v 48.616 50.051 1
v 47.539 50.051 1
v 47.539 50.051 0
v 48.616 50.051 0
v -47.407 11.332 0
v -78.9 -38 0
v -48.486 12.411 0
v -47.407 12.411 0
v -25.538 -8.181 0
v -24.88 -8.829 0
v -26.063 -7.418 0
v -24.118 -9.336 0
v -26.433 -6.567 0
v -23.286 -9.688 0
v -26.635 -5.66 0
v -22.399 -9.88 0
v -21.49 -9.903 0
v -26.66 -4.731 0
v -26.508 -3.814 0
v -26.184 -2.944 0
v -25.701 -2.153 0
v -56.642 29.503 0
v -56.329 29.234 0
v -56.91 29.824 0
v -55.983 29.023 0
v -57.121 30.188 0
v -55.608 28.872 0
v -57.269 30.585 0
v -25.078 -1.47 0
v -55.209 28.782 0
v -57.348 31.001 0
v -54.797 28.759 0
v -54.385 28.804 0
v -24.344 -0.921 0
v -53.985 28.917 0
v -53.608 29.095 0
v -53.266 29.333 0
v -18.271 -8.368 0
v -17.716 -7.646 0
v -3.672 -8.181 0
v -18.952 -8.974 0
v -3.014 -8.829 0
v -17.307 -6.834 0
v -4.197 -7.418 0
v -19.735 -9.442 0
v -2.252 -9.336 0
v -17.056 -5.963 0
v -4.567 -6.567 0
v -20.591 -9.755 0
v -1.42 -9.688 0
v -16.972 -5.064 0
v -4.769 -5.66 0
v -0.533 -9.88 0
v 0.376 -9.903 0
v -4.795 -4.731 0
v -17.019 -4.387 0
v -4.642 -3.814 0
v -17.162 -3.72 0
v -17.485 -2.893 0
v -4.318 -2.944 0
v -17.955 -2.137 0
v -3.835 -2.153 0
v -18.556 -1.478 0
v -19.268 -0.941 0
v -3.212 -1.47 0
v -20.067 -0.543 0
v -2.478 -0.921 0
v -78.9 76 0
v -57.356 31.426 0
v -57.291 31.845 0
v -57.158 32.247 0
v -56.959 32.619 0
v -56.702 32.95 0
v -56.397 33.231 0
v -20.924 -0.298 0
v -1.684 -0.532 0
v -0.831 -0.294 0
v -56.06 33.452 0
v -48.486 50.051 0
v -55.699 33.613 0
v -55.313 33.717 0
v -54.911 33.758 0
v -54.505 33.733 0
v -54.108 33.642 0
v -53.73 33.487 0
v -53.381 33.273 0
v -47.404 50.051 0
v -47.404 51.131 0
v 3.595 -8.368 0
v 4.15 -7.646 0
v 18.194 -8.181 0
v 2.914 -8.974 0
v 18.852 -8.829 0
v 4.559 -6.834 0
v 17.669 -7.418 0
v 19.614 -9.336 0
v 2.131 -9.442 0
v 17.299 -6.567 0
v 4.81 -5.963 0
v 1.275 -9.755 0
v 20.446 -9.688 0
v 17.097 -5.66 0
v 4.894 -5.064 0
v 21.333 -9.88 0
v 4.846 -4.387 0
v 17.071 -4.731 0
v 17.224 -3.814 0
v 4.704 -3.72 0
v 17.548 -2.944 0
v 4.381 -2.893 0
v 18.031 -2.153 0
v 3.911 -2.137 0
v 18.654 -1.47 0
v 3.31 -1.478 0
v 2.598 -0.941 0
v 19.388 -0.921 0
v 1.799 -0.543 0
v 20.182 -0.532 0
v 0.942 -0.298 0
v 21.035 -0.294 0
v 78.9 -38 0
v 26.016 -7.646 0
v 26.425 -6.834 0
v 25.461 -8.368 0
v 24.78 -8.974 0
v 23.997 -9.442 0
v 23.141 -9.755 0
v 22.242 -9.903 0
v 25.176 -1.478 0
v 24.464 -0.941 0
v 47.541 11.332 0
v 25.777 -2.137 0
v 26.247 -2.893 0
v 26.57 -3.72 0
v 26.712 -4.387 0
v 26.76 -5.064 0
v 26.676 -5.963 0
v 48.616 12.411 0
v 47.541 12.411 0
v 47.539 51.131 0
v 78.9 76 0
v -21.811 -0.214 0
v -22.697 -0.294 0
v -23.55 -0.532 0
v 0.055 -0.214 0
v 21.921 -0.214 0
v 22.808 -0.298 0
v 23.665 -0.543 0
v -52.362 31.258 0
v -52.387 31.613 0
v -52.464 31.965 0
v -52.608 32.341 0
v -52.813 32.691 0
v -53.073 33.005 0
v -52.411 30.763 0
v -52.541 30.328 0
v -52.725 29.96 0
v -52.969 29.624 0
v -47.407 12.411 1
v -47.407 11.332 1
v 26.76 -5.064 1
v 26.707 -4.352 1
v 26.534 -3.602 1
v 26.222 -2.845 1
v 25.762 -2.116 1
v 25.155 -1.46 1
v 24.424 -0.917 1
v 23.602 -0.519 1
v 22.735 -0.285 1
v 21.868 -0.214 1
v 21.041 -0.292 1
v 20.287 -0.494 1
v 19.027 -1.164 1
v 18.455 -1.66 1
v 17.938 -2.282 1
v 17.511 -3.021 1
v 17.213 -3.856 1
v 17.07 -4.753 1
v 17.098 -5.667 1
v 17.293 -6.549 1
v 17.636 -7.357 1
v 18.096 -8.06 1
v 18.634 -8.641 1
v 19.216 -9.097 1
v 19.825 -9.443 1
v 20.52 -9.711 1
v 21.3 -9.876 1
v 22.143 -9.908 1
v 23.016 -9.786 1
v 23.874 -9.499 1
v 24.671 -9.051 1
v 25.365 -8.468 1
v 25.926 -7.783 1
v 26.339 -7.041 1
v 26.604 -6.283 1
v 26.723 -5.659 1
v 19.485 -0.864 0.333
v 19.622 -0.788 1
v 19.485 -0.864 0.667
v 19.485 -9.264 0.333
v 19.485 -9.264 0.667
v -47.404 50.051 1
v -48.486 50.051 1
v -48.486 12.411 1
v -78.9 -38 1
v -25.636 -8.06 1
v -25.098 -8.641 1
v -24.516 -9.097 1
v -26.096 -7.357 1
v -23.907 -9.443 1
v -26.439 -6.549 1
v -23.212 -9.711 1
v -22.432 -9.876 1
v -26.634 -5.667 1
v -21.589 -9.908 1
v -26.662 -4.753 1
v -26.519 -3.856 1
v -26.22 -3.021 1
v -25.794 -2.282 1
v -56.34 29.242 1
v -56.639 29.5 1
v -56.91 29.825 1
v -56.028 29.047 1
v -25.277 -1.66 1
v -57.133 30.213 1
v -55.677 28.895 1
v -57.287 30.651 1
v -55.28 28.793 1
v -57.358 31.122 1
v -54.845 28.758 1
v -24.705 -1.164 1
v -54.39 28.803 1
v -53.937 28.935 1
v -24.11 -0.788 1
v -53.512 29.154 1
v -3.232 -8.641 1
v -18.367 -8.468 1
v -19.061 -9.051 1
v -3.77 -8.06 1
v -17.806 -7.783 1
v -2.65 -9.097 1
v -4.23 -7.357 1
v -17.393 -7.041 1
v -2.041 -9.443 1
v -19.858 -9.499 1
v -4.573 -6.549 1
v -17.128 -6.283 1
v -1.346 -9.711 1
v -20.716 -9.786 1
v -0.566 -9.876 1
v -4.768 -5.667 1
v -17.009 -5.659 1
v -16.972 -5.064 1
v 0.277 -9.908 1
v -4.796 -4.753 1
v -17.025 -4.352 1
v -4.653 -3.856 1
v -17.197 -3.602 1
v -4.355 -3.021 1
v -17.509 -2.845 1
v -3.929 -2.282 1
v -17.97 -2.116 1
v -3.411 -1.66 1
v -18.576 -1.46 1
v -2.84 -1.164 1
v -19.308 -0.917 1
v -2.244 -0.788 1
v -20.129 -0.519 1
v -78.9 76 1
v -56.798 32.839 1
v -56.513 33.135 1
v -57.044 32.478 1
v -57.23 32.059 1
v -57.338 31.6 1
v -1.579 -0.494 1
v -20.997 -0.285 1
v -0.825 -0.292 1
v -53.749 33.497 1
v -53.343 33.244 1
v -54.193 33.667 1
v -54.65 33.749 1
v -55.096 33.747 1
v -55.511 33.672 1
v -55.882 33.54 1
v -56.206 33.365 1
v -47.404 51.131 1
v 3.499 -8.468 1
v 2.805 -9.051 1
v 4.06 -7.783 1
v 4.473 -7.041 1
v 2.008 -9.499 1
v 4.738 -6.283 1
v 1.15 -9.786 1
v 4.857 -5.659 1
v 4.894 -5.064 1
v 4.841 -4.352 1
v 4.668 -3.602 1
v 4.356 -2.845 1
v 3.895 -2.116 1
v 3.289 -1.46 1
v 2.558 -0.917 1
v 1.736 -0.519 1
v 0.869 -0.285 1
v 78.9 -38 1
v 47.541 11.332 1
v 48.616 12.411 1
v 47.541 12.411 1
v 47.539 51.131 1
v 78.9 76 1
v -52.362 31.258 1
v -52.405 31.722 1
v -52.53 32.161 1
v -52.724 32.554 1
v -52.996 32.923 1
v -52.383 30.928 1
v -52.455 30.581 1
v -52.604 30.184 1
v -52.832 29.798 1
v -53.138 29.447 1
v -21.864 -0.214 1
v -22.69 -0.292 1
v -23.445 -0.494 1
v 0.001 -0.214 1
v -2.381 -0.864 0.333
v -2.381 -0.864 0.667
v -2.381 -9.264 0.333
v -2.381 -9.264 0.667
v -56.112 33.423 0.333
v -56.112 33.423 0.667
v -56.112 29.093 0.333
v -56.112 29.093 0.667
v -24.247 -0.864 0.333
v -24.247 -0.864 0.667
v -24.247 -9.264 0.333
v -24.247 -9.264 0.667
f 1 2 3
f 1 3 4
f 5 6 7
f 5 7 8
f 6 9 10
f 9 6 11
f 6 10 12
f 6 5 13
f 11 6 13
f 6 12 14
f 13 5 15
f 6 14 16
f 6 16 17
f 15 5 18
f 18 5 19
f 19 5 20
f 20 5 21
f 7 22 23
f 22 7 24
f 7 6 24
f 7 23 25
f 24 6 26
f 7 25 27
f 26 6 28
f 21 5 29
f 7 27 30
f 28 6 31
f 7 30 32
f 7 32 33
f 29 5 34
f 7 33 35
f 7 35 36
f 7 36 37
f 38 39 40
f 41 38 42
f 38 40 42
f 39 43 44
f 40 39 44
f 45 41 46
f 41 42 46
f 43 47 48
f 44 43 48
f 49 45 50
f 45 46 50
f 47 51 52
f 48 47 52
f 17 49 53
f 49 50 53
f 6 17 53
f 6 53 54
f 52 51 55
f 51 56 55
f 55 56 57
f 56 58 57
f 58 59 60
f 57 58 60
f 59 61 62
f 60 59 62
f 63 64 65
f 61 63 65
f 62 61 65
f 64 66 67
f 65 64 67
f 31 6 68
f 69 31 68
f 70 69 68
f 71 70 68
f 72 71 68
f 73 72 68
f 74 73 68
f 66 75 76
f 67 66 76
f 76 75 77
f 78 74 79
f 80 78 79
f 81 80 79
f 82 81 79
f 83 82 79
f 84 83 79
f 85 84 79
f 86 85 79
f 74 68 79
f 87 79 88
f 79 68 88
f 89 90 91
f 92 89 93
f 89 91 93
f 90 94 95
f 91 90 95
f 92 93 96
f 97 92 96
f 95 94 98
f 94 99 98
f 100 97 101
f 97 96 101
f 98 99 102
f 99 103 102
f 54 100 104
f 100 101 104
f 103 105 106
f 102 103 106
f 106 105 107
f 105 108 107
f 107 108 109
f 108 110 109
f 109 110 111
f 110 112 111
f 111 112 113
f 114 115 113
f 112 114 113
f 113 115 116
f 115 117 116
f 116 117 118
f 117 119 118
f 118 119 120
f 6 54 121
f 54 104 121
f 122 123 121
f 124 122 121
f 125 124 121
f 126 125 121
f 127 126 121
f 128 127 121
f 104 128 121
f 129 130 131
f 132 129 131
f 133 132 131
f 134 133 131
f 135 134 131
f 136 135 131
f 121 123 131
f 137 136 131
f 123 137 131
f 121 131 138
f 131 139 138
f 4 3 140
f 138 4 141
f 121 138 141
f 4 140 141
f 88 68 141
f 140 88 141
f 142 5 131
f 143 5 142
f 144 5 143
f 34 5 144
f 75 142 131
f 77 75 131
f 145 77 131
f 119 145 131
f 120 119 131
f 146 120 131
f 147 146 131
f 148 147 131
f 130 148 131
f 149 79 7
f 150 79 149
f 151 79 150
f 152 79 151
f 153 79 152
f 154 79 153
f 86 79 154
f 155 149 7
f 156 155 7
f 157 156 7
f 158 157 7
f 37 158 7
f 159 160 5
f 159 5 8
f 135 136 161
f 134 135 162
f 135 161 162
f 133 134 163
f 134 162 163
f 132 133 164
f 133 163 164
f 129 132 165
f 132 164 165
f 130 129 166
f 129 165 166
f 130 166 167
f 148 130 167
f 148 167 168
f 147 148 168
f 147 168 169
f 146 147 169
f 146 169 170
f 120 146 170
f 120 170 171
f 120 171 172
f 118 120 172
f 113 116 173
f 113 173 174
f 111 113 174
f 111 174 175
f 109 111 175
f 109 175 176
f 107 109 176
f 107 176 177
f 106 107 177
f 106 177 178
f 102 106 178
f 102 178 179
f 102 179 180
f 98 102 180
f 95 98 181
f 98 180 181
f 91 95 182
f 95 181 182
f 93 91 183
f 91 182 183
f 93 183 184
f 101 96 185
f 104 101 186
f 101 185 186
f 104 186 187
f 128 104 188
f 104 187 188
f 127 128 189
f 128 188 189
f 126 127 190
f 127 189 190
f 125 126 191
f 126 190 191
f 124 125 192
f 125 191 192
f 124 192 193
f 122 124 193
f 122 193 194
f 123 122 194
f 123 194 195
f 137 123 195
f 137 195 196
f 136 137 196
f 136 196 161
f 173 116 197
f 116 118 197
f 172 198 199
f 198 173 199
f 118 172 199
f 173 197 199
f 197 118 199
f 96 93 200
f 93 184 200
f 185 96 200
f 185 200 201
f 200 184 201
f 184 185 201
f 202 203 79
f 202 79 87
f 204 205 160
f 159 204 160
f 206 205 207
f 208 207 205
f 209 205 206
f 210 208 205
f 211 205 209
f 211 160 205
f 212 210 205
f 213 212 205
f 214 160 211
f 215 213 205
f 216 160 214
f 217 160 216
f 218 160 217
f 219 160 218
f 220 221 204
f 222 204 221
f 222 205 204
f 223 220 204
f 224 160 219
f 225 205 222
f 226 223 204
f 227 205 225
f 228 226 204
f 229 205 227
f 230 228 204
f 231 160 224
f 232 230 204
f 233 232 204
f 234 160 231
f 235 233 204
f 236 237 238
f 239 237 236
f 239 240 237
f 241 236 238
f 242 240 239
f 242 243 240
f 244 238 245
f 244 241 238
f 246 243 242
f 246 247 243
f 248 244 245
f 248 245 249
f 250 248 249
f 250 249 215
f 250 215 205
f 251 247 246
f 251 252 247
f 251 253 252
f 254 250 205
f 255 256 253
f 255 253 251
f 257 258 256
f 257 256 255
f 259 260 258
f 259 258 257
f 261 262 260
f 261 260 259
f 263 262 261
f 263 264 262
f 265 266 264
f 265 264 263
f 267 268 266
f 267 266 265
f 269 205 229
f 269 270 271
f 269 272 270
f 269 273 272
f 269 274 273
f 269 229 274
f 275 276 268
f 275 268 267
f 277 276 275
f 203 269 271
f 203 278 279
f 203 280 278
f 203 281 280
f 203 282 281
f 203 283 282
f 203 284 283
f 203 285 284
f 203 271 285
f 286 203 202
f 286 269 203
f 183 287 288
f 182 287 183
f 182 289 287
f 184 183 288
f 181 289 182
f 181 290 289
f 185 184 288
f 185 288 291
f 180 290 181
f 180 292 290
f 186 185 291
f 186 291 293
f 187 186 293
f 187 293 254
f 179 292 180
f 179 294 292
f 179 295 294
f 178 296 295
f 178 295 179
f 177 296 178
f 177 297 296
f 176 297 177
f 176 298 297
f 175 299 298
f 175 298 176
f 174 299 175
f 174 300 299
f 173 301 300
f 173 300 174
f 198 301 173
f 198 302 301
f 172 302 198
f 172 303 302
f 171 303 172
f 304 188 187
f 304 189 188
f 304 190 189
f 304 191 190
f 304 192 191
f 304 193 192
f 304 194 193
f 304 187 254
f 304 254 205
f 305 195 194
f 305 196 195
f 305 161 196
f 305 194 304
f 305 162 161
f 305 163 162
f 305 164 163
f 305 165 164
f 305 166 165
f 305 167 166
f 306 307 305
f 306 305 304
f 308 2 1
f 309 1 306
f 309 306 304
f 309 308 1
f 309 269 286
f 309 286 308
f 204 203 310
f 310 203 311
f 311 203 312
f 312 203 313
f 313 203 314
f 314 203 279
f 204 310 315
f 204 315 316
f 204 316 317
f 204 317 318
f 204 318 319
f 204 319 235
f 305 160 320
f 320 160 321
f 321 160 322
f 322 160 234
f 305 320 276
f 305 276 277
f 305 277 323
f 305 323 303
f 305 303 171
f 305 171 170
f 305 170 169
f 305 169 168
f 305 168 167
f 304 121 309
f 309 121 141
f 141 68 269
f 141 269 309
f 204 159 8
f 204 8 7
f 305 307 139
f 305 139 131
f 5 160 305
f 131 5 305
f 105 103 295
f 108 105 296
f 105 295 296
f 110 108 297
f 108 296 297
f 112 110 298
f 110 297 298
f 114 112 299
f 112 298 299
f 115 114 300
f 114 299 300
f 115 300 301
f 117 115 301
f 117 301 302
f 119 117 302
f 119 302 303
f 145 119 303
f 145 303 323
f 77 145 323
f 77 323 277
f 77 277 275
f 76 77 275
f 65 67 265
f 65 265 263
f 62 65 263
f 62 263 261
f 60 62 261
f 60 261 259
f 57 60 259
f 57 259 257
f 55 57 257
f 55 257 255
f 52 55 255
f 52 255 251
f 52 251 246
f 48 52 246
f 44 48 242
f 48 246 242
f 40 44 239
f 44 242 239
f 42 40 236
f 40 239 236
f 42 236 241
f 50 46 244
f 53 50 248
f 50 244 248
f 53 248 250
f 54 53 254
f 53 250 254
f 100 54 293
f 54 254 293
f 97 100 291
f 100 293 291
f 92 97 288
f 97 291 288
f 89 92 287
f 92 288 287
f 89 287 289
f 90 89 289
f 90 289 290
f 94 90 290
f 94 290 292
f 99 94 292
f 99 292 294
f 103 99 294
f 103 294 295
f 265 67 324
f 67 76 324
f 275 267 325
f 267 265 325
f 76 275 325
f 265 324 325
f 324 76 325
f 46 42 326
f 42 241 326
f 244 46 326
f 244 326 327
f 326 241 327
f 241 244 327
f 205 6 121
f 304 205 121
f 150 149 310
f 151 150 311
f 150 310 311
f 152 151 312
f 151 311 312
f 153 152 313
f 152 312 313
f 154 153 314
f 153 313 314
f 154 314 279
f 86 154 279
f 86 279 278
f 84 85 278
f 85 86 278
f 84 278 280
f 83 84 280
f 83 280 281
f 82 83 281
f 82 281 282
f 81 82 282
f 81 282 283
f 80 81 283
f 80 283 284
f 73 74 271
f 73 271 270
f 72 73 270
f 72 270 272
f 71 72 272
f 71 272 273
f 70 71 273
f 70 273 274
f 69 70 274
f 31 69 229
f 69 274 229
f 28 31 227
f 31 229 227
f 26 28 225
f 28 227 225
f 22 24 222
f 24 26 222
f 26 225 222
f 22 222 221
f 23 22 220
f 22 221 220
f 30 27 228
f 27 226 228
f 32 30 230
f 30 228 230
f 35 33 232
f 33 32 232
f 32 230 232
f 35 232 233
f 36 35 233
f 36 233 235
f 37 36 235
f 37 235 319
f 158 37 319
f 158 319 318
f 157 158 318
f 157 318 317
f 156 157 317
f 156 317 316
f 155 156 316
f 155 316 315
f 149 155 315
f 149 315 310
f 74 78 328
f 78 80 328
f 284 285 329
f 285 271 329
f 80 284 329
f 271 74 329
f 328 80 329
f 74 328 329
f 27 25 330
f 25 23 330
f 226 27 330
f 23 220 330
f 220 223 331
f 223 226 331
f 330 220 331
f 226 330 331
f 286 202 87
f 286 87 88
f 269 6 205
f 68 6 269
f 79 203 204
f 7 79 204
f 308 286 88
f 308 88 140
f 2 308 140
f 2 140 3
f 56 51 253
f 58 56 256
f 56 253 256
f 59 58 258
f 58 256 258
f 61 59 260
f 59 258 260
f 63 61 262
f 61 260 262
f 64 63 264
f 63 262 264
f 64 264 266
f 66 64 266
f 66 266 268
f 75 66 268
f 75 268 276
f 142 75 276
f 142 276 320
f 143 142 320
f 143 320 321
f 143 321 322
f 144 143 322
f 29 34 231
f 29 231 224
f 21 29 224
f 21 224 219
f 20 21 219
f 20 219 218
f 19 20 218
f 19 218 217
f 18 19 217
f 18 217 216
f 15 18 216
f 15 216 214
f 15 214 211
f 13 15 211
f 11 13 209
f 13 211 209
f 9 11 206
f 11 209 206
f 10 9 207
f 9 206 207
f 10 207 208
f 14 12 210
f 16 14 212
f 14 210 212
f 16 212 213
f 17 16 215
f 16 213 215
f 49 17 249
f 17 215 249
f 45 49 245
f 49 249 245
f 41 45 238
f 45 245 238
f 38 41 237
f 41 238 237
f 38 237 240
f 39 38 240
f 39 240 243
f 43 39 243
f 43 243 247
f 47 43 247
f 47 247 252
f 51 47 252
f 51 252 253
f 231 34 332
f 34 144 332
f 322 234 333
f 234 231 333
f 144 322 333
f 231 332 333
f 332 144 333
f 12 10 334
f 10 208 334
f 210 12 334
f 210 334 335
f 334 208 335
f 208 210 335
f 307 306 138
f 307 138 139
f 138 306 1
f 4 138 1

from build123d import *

# Parameters (mm, degrees)
SKETCH_W        = 157.8
SKETCH_H        = 114
PAD_DEPTH       = 1
POCKET001_DEPTH = 1.001
POCKET002_DEPTH = 1.001


with BuildPart() as part:
    # Sketch → Pad (new body)
    with BuildSketch(Plane.XY):
        with Locations((0, 19)):
            Rectangle(SKETCH_W, SKETCH_H)
    extrude(amount=PAD_DEPTH)

    # Sketch026 (on Face6 of Pad) → Pocket001 (cut, through all)
    with BuildSketch(Plane(origin=(0, 15, 1), x_dir=(1, 0, 0), z_dir=(0, 0, 1))):
        with BuildLine():
            add(Edge.make_bspline(
                [(-48.4861, 35.05146), (-47.40406, 35.05146)],
                knots=[0, 0, 426, 426], degree=1))
            add(Edge.make_bspline(
                [(-47.40406, 35.05146), (-47.40406, 36.13096)],
                knots=[0, 0, 425, 425], degree=1))
            add(Edge.make_bspline(
                [(-47.40406, 36.13096), (47.5386, 36.13096)],
                knots=[0, 0, 37379, 37379], degree=1))
            add(Edge.make_bspline(
                [(47.5386, 36.13096), (47.5386, 35.05146)],
                knots=[0, 0, 425, 425], degree=1))
            add(Edge.make_bspline(
                [(47.5386, 35.05146), (48.61556, 35.05146)],
                knots=[0, 0, 424, 424], degree=1))
            add(Edge.make_bspline(
                [(48.61556, -2.5888), (48.61556, 35.05146)],
                knots=[0, 0, 14819, 14819], degree=1))
            add(Edge.make_bspline(
                [(48.61556, -2.5888), (47.54114, -2.5888)],
                knots=[0, 0, 423, 423], degree=1))
            add(Edge.make_bspline(
                [(47.54114, -2.5888), (47.54114, -3.6683)],
                knots=[0, 0, 425, 425], degree=1))
            add(Edge.make_bspline(
                [(-47.4066, -3.6683), (47.54114, -3.6683)],
                knots=[0, 0, 37381, 37381], degree=1))
            add(Edge.make_bspline(
                [(-47.4066, -3.6683), (-47.4066, -2.5888)],
                knots=[0, 0, 425, 425], degree=1))
            add(Edge.make_bspline(
                [(-47.4066, -2.5888), (-48.4861, -2.5888)],
                knots=[0, 0, 425, 425], degree=1))
            add(Edge.make_bspline(
                [(-48.4861, 35.05146), (-48.4861, -2.5888)],
                knots=[0, 0, 14819, 14819], degree=1))
        make_face()
    extrude(amount=-POCKET001_DEPTH, mode=Mode.SUBTRACT)

    # Sketch013 → Pocket002 (cut, through all)
    with BuildSketch(Plane(origin=(0, 15, 1), x_dir=(1, 0, 0), z_dir=(0, 0, 1))):
        with BuildLine():
            add(Edge.make_bspline(
                [(-52.3615, 16.258), (-52.3615, 20.588127), (-56.1115, 18.423064), (-59.8615, 16.258), (-56.1115, 14.092936), (-52.3615, 11.927873), (-52.3615, 16.258)],
                knots=[0, 0, 0, 2.094395, 2.094395, 4.18879, 4.18879, 6.283185, 6.283185, 6.283185], degree=2, weights=[1, 0.5, 1, 0.5, 1, 0.5, 1]))
        make_face()
        with BuildLine():
            add(Edge.make_bspline(
                [(-16.971939, -20.064), (-16.971939, -11.663548), (-24.246944, -15.863774), (-31.521948, -20.064), (-24.246944, -24.264226), (-16.971939, -28.464452), (-16.971939, -20.064)],
                knots=[0, 0, 0, 2.094395, 2.094395, 4.18879, 4.18879, 6.283185, 6.283185, 6.283185], degree=2, weights=[1, 0.5, 1, 0.5, 1, 0.5, 1]))
        make_face()
        with BuildLine():
            add(Edge.make_bspline(
                [(4.893905, -20.064), (4.893905, -11.663548), (-2.3811, -15.863774), (-9.656104, -20.064), (-2.3811, -24.264226), (4.893905, -28.464452), (4.893905, -20.064)],
                knots=[0, 0, 0, 2.094395, 2.094395, 4.18879, 4.18879, 6.283185, 6.283185, 6.283185], degree=2, weights=[1, 0.5, 1, 0.5, 1, 0.5, 1]))
        make_face()
        with BuildLine():
            add(Edge.make_bspline(
                [(26.760003, -20.064), (26.760003, -11.663548), (19.484998, -15.863774), (12.209994, -20.064), (19.484998, -24.264226), (26.760003, -28.464452), (26.760003, -20.064)],
                knots=[0, 0, 0, 2.094395, 2.094395, 4.18879, 4.18879, 6.283185, 6.283185, 6.283185], degree=2, weights=[1, 0.5, 1, 0.5, 1, 0.5, 1]))
        make_face()
    extrude(amount=-POCKET002_DEPTH, mode=Mode.SUBTRACT)


solid = part.part
